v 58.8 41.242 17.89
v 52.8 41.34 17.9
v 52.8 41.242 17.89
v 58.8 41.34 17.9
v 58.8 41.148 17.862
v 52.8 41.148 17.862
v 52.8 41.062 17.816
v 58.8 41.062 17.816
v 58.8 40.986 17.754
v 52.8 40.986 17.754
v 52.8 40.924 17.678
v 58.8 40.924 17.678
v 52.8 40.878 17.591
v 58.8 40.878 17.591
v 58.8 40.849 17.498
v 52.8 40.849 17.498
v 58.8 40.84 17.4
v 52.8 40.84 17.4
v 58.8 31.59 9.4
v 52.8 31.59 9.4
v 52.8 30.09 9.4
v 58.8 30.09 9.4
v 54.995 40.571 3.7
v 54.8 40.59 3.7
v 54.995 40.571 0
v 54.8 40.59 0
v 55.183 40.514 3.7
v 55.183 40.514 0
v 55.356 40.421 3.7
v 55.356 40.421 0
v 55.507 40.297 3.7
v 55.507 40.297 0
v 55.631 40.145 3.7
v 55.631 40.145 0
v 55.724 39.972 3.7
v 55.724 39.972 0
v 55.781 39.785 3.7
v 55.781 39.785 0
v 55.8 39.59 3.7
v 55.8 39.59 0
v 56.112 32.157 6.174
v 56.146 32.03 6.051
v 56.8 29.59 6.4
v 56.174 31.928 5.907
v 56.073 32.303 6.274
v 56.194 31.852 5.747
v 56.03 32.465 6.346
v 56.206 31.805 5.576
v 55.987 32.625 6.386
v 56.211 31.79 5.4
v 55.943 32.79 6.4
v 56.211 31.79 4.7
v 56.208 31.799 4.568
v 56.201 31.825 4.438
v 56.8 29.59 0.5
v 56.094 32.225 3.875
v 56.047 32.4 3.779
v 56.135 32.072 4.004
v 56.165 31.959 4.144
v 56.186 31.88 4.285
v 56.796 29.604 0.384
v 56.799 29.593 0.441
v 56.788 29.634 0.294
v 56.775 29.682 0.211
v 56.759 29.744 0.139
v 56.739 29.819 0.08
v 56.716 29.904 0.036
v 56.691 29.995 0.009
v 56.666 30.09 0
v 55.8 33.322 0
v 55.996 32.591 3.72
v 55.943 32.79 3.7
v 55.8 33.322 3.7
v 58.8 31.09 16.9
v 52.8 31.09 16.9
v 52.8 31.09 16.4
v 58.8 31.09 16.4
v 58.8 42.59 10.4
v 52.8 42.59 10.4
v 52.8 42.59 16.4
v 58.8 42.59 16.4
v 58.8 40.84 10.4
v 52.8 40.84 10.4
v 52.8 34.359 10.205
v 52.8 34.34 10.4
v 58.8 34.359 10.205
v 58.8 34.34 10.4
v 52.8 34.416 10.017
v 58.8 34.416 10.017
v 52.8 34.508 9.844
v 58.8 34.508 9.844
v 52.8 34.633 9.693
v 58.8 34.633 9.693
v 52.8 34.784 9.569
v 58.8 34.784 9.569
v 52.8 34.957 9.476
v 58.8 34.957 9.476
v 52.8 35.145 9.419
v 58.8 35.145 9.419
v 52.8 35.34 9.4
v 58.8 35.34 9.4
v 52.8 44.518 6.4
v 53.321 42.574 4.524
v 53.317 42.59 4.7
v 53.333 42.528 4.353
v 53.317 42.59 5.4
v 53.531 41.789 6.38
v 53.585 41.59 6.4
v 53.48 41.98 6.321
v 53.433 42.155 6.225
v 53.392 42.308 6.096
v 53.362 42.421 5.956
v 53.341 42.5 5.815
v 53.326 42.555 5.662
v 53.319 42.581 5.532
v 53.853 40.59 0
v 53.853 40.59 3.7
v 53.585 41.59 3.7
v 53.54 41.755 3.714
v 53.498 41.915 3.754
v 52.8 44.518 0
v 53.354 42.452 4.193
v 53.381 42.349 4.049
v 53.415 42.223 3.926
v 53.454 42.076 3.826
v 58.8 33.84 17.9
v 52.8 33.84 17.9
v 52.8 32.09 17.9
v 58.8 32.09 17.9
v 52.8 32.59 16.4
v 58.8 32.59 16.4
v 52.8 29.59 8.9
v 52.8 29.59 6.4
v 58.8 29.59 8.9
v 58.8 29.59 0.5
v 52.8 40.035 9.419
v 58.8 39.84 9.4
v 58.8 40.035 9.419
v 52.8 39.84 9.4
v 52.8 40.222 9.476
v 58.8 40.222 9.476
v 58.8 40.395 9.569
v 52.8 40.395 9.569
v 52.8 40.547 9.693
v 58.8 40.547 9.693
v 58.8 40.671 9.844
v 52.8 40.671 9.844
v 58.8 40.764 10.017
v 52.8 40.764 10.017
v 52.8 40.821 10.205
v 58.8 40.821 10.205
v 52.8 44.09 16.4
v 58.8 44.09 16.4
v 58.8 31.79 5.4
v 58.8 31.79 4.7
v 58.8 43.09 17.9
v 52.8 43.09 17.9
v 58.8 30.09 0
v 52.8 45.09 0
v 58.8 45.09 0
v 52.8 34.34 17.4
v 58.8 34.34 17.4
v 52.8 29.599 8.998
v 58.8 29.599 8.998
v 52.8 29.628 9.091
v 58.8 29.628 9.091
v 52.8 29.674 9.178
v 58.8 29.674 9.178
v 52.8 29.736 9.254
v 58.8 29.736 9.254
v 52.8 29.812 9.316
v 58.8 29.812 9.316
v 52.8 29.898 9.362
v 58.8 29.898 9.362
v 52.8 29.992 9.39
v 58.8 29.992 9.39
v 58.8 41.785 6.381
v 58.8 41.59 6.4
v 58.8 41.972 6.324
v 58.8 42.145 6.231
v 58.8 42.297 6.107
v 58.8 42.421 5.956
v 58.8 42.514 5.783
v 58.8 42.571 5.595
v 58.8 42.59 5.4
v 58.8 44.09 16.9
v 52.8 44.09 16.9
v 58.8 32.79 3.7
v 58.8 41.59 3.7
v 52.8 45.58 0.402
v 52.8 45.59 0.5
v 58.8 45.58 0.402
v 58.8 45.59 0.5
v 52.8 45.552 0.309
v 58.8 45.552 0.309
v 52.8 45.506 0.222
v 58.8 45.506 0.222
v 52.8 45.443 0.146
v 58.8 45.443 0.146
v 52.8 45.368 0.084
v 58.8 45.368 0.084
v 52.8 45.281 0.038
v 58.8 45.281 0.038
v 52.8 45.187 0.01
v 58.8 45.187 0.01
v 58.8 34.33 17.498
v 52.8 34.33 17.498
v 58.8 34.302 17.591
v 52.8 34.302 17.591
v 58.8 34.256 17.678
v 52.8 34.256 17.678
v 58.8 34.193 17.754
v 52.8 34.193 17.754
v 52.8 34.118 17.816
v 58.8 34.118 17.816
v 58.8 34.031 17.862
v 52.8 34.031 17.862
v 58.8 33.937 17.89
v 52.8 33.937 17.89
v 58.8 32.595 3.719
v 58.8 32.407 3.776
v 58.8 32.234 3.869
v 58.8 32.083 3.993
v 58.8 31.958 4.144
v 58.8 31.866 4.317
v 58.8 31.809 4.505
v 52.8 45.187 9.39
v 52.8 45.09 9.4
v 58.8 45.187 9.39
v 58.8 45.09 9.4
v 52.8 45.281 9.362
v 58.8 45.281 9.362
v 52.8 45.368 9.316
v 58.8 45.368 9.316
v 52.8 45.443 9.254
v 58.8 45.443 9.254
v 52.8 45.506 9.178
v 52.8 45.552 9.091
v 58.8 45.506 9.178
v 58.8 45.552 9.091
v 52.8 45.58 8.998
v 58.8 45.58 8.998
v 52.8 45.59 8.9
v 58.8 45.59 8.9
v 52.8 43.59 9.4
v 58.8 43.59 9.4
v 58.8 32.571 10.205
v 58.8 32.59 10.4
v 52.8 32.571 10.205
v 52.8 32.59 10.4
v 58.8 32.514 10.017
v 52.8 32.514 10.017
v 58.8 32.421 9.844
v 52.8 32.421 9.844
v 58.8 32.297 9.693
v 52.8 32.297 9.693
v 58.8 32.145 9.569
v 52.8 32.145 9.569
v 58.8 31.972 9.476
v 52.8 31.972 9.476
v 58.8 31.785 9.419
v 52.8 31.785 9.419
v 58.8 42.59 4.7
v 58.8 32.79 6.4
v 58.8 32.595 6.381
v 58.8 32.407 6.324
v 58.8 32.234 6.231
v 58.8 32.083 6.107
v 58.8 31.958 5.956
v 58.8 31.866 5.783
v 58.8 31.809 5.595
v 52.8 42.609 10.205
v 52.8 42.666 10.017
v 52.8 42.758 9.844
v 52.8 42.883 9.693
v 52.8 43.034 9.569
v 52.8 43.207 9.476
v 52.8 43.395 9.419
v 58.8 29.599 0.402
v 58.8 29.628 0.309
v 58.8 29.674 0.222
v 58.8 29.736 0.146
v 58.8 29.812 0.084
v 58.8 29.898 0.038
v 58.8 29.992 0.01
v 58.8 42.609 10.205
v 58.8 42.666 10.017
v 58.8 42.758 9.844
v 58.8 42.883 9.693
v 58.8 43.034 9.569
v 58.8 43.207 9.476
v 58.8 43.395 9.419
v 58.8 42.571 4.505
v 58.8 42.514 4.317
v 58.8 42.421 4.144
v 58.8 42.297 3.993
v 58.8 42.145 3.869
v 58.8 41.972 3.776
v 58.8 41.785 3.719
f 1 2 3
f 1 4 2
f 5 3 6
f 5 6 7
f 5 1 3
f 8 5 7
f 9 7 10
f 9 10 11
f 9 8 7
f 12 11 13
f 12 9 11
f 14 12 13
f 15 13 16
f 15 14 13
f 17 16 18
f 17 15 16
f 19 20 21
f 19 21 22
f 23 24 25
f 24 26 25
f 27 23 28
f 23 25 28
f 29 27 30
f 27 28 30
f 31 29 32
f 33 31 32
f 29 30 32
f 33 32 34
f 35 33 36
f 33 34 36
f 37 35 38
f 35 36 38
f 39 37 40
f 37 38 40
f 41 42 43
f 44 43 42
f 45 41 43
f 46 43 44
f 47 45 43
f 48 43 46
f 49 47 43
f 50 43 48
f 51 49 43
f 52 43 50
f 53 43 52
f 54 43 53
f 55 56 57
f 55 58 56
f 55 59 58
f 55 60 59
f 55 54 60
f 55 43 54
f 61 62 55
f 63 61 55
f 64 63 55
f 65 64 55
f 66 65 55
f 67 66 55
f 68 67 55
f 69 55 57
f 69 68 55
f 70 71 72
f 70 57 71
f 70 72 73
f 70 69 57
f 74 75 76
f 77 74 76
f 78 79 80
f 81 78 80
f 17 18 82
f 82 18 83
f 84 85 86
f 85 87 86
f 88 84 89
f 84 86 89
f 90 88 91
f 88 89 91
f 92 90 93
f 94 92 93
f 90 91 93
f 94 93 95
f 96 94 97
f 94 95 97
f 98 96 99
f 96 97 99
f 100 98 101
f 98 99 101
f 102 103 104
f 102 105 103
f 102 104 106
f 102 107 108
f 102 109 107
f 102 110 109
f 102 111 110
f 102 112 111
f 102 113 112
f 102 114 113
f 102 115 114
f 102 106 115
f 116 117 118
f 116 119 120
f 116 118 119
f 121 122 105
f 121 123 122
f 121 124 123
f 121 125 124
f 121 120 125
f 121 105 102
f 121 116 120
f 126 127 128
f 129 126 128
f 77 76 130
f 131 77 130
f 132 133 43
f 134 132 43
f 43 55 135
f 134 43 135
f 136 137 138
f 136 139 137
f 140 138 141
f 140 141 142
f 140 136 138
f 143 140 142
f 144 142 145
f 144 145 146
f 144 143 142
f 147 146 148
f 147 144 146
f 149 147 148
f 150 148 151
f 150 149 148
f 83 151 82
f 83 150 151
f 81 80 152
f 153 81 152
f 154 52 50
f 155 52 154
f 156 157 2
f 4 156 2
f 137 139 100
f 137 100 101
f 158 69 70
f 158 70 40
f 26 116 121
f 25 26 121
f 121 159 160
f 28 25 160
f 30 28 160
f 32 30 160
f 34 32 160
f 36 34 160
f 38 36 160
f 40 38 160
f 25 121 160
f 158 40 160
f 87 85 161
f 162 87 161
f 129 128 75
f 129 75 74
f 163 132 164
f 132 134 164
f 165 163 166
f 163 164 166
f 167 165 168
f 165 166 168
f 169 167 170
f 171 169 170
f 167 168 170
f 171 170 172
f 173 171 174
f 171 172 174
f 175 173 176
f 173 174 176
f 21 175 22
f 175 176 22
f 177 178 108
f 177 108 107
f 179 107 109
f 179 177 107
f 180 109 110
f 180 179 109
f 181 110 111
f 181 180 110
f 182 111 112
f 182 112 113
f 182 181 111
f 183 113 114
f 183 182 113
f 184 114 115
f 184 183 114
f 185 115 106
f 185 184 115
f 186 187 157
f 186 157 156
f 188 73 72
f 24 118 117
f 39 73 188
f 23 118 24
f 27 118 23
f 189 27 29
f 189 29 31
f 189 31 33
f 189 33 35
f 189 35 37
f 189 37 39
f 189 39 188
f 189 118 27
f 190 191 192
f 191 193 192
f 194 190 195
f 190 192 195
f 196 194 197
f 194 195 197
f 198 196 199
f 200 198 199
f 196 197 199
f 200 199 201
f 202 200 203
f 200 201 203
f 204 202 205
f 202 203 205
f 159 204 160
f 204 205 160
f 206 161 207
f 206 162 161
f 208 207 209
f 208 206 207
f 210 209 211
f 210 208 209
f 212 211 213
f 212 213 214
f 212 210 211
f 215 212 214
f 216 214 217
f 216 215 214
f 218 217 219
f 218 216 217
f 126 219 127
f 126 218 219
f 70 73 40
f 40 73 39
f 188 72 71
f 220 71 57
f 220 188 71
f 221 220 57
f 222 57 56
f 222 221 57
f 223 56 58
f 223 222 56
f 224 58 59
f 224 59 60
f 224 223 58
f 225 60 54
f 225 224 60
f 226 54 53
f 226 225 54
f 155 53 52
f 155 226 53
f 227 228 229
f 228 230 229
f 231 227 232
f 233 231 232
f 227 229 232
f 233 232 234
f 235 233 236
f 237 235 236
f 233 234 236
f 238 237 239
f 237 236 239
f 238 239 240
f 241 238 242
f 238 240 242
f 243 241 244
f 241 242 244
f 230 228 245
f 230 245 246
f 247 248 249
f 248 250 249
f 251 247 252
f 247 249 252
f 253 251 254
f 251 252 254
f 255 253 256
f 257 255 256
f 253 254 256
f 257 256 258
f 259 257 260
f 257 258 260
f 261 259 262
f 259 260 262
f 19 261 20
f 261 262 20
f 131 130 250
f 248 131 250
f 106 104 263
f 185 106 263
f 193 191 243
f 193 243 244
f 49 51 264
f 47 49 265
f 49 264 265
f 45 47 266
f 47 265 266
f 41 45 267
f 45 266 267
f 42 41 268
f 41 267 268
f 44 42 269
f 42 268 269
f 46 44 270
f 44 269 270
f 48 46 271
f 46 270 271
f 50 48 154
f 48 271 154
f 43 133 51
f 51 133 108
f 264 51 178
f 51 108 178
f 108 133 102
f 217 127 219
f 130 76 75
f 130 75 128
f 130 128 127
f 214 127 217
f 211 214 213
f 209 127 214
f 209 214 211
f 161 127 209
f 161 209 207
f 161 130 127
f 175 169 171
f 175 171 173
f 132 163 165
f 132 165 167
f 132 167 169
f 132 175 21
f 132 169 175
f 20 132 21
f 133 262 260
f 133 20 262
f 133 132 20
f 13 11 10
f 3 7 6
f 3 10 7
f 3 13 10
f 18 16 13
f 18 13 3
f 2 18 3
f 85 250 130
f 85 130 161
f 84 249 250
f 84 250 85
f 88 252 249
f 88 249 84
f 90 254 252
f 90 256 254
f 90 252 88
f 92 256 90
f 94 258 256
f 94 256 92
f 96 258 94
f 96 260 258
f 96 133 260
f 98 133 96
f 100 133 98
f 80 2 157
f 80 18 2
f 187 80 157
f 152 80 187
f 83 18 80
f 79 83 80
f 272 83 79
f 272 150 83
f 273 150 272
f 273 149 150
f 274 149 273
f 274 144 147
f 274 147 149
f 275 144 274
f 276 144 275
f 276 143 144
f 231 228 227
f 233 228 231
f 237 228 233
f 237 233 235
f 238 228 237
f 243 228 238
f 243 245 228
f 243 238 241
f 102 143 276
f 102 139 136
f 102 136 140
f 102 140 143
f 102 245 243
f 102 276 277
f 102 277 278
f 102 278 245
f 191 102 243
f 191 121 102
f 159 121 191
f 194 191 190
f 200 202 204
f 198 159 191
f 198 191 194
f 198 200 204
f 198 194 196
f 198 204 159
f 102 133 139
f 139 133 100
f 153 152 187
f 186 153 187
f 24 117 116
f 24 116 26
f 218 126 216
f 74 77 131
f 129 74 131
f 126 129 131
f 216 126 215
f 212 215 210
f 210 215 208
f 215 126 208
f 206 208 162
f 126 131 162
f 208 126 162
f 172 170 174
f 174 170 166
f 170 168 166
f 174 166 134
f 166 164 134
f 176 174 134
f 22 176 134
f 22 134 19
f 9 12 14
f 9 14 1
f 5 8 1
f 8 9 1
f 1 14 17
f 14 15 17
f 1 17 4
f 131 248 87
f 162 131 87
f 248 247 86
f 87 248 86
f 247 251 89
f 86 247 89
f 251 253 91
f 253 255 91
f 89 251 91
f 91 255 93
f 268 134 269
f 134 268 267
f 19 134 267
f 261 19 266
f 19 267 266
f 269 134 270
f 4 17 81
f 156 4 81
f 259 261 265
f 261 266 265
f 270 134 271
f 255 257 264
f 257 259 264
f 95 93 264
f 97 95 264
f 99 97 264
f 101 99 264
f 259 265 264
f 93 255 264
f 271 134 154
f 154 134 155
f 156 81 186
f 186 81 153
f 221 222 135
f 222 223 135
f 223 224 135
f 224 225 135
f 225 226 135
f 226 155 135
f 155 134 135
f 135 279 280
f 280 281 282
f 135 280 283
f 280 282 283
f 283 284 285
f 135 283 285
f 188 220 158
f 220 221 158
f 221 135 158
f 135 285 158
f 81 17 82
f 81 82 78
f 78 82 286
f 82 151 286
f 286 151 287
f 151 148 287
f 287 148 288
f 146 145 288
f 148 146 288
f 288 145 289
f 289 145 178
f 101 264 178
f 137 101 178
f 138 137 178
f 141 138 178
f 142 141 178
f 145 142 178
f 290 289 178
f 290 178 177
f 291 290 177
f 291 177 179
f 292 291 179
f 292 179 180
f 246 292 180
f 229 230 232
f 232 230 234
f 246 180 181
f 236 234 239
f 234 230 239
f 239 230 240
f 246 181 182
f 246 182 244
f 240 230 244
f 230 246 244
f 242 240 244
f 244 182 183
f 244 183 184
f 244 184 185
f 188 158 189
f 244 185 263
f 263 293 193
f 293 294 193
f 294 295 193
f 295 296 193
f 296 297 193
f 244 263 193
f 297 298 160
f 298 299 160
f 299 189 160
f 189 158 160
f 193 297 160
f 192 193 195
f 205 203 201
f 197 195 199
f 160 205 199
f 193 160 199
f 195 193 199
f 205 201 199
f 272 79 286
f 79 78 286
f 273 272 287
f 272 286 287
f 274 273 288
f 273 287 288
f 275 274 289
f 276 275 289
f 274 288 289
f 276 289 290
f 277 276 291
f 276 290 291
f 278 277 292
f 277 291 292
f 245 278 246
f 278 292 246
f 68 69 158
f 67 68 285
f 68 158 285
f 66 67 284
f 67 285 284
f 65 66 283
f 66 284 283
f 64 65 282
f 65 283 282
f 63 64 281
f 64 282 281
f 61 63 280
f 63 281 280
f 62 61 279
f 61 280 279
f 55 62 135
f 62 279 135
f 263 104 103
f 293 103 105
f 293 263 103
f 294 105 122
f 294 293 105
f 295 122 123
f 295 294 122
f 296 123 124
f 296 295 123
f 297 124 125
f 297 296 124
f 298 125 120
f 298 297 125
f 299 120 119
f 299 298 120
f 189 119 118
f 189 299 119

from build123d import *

# Parameters (mm, degrees)
ESQUISSE1_W             = 6
ESQUISSE1_H             = 16
EXTRUSION1_DEPTH        = 3.7
ESQUISSE2_W             = 6
ESQUISSE2_H             = 3
ESQUISSE2_W_2           = 3
ESQUISSE2_H_2           = 2.2
EXTRUSION2_DEPTH        = 2.7
ESQUISSE3_W             = 3
ESQUISSE3_H             = 11
ENL_V_MAT_EXTRU_1_DEPTH = 5
ESQUISSE4_W             = 6
ESQUISSE4_H             = 16
EXTRUSION3_DEPTH        = 3
EXTRUSION4_DEPTH        = 6
CHANFREIN1_SIZE         = 1
CONG_1_R                = 1
CONG_2_R                = 0.5
ENL_V_MAT_EXTRU_2_REACH = 78.526


with BuildPart() as part:
    # Esquisse1 → Extrusion1 (new body)
    with BuildSketch(Plane.XY):
        with Locations((55.8, 37.58978076)):
            Rectangle(ESQUISSE1_W, ESQUISSE1_H)
    extrude(amount=EXTRUSION1_DEPTH)

    # Esquisse2 → Extrusion2 (add)
    with BuildSketch(Plane.XY.offset(3.7)):
        with Locations((55.8, 44.08978076)):
            Rectangle(ESQUISSE2_W, ESQUISSE2_H)
        with Locations((57.3, 30.68978076)):
            Rectangle(ESQUISSE2_W_2, ESQUISSE2_H_2)
    extrude(amount=EXTRUSION2_DEPTH)

    # Esquisse3 → Enlèv. mat.-Extru.1 (cut)
    with BuildSketch(Plane.XY.offset(3.7)):
        with Locations((54.3, 35.08978076)):
            Rectangle(ESQUISSE3_W, ESQUISSE3_H)
    extrude(amount=-ENL_V_MAT_EXTRU_1_DEPTH, mode=Mode.SUBTRACT)

    # Esquisse4 → Extrusion3 (add)
    with BuildSketch(Plane.XY.offset(6.4)):
        with Locations((55.8, 37.58978076)):
            Rectangle(ESQUISSE4_W, ESQUISSE4_H)
    extrude(amount=EXTRUSION3_DEPTH)

    # Esquisse5 → Extrusion4 (add)
    with BuildSketch(Plane.ZY.offset(-52.8)):
        Polygon((8.183216319, 42.58978076), (16.4, 42.58978076), (16.4, 44.08978076), (17.9, 44.08978076), (17.9, 40.83978076), (9.2, 40.83978076), (9.2, 34.33978076), (17.9, 34.33978076), (17.9, 31.08978076), (16.4, 31.08978076), (16.4, 32.58978076), (8.183216319, 32.58978076), align=None)
    extrude(amount=-EXTRUSION4_DEPTH)

    # Chanfrein1
    chanfrein1_edges = [part.edges().sort_by_distance(p)[0] for p in [
        (55.8, 44.08978076, 17.9),
        (55.8, 31.08978076, 17.9),
    ]]
    chamfer(chanfrein1_edges, length=CHANFREIN1_SIZE)

    # Congé1
    cong_1_edges = [part.edges().sort_by_distance(p)[0] for p in [
        (55.8, 40.58978076, 1.85),
        (55.8, 42.58978076, 6.4),
        (55.8, 42.58978076, 3.7),
        (57.3, 31.78978076, 3.7),
        (57.3, 31.78978076, 6.4),
        (55.8, 34.33978076, 9.4),
        (55.8, 42.58978076, 9.4),
        (55.8, 32.58978076, 9.4),
        (55.8, 40.83978076, 9.4),
    ]]
    fillet(cong_1_edges, radius=CONG_1_R)

    # Congé2
    cong_2_edges = [part.edges().sort_by_distance(p)[0] for p in [
        (57.3, 29.58978076, 0),
        (55.8, 45.58978076, 0),
        (55.8, 29.58978076, 9.4),
        (55.8, 45.58978076, 9.4),
        (55.8, 40.83978076, 17.9),
        (55.8, 34.33978076, 17.9),
    ]]
    fillet(cong_2_edges, radius=CONG_2_R)

    # Enlèv. mat.-Extru.2: up to this face of the body (flat: up to its plane)
    enl_v_mat_extru_2_end = Plane(part.part.faces().sort_by_distance((55.569230769, 36.266703837, 6.4))[0])
    # Esquisse6 → Enlèv. mat.-Extru.2 (cut, up to the picked face)
    with BuildSketch(Plane(origin=(0, 0, 0), x_dir=(-1, 0, 0), z_dir=(0, 0, -1)), mode=Mode.PRIVATE) as enl_v_mat_extru_2_sk1:
        Polygon((-56.8, 29.58978076), (-52.381825652, 46.078631902), (-52.381825652, 29.58978076), align=None)
    enl_v_mat_extru_2_tool1 = split(extrude(enl_v_mat_extru_2_sk1.sketch, amount=-ENL_V_MAT_EXTRU_2_REACH, mode=Mode.PRIVATE), bisect_by=enl_v_mat_extru_2_end, keep=Keep.BOTH, mode=Mode.PRIVATE)
    add(enl_v_mat_extru_2_tool1.solids().sort_by(Axis((53.85455, 35.086064, 0), (0, 0, 1)))[0], mode=Mode.SUBTRACT)


solid = part.part
